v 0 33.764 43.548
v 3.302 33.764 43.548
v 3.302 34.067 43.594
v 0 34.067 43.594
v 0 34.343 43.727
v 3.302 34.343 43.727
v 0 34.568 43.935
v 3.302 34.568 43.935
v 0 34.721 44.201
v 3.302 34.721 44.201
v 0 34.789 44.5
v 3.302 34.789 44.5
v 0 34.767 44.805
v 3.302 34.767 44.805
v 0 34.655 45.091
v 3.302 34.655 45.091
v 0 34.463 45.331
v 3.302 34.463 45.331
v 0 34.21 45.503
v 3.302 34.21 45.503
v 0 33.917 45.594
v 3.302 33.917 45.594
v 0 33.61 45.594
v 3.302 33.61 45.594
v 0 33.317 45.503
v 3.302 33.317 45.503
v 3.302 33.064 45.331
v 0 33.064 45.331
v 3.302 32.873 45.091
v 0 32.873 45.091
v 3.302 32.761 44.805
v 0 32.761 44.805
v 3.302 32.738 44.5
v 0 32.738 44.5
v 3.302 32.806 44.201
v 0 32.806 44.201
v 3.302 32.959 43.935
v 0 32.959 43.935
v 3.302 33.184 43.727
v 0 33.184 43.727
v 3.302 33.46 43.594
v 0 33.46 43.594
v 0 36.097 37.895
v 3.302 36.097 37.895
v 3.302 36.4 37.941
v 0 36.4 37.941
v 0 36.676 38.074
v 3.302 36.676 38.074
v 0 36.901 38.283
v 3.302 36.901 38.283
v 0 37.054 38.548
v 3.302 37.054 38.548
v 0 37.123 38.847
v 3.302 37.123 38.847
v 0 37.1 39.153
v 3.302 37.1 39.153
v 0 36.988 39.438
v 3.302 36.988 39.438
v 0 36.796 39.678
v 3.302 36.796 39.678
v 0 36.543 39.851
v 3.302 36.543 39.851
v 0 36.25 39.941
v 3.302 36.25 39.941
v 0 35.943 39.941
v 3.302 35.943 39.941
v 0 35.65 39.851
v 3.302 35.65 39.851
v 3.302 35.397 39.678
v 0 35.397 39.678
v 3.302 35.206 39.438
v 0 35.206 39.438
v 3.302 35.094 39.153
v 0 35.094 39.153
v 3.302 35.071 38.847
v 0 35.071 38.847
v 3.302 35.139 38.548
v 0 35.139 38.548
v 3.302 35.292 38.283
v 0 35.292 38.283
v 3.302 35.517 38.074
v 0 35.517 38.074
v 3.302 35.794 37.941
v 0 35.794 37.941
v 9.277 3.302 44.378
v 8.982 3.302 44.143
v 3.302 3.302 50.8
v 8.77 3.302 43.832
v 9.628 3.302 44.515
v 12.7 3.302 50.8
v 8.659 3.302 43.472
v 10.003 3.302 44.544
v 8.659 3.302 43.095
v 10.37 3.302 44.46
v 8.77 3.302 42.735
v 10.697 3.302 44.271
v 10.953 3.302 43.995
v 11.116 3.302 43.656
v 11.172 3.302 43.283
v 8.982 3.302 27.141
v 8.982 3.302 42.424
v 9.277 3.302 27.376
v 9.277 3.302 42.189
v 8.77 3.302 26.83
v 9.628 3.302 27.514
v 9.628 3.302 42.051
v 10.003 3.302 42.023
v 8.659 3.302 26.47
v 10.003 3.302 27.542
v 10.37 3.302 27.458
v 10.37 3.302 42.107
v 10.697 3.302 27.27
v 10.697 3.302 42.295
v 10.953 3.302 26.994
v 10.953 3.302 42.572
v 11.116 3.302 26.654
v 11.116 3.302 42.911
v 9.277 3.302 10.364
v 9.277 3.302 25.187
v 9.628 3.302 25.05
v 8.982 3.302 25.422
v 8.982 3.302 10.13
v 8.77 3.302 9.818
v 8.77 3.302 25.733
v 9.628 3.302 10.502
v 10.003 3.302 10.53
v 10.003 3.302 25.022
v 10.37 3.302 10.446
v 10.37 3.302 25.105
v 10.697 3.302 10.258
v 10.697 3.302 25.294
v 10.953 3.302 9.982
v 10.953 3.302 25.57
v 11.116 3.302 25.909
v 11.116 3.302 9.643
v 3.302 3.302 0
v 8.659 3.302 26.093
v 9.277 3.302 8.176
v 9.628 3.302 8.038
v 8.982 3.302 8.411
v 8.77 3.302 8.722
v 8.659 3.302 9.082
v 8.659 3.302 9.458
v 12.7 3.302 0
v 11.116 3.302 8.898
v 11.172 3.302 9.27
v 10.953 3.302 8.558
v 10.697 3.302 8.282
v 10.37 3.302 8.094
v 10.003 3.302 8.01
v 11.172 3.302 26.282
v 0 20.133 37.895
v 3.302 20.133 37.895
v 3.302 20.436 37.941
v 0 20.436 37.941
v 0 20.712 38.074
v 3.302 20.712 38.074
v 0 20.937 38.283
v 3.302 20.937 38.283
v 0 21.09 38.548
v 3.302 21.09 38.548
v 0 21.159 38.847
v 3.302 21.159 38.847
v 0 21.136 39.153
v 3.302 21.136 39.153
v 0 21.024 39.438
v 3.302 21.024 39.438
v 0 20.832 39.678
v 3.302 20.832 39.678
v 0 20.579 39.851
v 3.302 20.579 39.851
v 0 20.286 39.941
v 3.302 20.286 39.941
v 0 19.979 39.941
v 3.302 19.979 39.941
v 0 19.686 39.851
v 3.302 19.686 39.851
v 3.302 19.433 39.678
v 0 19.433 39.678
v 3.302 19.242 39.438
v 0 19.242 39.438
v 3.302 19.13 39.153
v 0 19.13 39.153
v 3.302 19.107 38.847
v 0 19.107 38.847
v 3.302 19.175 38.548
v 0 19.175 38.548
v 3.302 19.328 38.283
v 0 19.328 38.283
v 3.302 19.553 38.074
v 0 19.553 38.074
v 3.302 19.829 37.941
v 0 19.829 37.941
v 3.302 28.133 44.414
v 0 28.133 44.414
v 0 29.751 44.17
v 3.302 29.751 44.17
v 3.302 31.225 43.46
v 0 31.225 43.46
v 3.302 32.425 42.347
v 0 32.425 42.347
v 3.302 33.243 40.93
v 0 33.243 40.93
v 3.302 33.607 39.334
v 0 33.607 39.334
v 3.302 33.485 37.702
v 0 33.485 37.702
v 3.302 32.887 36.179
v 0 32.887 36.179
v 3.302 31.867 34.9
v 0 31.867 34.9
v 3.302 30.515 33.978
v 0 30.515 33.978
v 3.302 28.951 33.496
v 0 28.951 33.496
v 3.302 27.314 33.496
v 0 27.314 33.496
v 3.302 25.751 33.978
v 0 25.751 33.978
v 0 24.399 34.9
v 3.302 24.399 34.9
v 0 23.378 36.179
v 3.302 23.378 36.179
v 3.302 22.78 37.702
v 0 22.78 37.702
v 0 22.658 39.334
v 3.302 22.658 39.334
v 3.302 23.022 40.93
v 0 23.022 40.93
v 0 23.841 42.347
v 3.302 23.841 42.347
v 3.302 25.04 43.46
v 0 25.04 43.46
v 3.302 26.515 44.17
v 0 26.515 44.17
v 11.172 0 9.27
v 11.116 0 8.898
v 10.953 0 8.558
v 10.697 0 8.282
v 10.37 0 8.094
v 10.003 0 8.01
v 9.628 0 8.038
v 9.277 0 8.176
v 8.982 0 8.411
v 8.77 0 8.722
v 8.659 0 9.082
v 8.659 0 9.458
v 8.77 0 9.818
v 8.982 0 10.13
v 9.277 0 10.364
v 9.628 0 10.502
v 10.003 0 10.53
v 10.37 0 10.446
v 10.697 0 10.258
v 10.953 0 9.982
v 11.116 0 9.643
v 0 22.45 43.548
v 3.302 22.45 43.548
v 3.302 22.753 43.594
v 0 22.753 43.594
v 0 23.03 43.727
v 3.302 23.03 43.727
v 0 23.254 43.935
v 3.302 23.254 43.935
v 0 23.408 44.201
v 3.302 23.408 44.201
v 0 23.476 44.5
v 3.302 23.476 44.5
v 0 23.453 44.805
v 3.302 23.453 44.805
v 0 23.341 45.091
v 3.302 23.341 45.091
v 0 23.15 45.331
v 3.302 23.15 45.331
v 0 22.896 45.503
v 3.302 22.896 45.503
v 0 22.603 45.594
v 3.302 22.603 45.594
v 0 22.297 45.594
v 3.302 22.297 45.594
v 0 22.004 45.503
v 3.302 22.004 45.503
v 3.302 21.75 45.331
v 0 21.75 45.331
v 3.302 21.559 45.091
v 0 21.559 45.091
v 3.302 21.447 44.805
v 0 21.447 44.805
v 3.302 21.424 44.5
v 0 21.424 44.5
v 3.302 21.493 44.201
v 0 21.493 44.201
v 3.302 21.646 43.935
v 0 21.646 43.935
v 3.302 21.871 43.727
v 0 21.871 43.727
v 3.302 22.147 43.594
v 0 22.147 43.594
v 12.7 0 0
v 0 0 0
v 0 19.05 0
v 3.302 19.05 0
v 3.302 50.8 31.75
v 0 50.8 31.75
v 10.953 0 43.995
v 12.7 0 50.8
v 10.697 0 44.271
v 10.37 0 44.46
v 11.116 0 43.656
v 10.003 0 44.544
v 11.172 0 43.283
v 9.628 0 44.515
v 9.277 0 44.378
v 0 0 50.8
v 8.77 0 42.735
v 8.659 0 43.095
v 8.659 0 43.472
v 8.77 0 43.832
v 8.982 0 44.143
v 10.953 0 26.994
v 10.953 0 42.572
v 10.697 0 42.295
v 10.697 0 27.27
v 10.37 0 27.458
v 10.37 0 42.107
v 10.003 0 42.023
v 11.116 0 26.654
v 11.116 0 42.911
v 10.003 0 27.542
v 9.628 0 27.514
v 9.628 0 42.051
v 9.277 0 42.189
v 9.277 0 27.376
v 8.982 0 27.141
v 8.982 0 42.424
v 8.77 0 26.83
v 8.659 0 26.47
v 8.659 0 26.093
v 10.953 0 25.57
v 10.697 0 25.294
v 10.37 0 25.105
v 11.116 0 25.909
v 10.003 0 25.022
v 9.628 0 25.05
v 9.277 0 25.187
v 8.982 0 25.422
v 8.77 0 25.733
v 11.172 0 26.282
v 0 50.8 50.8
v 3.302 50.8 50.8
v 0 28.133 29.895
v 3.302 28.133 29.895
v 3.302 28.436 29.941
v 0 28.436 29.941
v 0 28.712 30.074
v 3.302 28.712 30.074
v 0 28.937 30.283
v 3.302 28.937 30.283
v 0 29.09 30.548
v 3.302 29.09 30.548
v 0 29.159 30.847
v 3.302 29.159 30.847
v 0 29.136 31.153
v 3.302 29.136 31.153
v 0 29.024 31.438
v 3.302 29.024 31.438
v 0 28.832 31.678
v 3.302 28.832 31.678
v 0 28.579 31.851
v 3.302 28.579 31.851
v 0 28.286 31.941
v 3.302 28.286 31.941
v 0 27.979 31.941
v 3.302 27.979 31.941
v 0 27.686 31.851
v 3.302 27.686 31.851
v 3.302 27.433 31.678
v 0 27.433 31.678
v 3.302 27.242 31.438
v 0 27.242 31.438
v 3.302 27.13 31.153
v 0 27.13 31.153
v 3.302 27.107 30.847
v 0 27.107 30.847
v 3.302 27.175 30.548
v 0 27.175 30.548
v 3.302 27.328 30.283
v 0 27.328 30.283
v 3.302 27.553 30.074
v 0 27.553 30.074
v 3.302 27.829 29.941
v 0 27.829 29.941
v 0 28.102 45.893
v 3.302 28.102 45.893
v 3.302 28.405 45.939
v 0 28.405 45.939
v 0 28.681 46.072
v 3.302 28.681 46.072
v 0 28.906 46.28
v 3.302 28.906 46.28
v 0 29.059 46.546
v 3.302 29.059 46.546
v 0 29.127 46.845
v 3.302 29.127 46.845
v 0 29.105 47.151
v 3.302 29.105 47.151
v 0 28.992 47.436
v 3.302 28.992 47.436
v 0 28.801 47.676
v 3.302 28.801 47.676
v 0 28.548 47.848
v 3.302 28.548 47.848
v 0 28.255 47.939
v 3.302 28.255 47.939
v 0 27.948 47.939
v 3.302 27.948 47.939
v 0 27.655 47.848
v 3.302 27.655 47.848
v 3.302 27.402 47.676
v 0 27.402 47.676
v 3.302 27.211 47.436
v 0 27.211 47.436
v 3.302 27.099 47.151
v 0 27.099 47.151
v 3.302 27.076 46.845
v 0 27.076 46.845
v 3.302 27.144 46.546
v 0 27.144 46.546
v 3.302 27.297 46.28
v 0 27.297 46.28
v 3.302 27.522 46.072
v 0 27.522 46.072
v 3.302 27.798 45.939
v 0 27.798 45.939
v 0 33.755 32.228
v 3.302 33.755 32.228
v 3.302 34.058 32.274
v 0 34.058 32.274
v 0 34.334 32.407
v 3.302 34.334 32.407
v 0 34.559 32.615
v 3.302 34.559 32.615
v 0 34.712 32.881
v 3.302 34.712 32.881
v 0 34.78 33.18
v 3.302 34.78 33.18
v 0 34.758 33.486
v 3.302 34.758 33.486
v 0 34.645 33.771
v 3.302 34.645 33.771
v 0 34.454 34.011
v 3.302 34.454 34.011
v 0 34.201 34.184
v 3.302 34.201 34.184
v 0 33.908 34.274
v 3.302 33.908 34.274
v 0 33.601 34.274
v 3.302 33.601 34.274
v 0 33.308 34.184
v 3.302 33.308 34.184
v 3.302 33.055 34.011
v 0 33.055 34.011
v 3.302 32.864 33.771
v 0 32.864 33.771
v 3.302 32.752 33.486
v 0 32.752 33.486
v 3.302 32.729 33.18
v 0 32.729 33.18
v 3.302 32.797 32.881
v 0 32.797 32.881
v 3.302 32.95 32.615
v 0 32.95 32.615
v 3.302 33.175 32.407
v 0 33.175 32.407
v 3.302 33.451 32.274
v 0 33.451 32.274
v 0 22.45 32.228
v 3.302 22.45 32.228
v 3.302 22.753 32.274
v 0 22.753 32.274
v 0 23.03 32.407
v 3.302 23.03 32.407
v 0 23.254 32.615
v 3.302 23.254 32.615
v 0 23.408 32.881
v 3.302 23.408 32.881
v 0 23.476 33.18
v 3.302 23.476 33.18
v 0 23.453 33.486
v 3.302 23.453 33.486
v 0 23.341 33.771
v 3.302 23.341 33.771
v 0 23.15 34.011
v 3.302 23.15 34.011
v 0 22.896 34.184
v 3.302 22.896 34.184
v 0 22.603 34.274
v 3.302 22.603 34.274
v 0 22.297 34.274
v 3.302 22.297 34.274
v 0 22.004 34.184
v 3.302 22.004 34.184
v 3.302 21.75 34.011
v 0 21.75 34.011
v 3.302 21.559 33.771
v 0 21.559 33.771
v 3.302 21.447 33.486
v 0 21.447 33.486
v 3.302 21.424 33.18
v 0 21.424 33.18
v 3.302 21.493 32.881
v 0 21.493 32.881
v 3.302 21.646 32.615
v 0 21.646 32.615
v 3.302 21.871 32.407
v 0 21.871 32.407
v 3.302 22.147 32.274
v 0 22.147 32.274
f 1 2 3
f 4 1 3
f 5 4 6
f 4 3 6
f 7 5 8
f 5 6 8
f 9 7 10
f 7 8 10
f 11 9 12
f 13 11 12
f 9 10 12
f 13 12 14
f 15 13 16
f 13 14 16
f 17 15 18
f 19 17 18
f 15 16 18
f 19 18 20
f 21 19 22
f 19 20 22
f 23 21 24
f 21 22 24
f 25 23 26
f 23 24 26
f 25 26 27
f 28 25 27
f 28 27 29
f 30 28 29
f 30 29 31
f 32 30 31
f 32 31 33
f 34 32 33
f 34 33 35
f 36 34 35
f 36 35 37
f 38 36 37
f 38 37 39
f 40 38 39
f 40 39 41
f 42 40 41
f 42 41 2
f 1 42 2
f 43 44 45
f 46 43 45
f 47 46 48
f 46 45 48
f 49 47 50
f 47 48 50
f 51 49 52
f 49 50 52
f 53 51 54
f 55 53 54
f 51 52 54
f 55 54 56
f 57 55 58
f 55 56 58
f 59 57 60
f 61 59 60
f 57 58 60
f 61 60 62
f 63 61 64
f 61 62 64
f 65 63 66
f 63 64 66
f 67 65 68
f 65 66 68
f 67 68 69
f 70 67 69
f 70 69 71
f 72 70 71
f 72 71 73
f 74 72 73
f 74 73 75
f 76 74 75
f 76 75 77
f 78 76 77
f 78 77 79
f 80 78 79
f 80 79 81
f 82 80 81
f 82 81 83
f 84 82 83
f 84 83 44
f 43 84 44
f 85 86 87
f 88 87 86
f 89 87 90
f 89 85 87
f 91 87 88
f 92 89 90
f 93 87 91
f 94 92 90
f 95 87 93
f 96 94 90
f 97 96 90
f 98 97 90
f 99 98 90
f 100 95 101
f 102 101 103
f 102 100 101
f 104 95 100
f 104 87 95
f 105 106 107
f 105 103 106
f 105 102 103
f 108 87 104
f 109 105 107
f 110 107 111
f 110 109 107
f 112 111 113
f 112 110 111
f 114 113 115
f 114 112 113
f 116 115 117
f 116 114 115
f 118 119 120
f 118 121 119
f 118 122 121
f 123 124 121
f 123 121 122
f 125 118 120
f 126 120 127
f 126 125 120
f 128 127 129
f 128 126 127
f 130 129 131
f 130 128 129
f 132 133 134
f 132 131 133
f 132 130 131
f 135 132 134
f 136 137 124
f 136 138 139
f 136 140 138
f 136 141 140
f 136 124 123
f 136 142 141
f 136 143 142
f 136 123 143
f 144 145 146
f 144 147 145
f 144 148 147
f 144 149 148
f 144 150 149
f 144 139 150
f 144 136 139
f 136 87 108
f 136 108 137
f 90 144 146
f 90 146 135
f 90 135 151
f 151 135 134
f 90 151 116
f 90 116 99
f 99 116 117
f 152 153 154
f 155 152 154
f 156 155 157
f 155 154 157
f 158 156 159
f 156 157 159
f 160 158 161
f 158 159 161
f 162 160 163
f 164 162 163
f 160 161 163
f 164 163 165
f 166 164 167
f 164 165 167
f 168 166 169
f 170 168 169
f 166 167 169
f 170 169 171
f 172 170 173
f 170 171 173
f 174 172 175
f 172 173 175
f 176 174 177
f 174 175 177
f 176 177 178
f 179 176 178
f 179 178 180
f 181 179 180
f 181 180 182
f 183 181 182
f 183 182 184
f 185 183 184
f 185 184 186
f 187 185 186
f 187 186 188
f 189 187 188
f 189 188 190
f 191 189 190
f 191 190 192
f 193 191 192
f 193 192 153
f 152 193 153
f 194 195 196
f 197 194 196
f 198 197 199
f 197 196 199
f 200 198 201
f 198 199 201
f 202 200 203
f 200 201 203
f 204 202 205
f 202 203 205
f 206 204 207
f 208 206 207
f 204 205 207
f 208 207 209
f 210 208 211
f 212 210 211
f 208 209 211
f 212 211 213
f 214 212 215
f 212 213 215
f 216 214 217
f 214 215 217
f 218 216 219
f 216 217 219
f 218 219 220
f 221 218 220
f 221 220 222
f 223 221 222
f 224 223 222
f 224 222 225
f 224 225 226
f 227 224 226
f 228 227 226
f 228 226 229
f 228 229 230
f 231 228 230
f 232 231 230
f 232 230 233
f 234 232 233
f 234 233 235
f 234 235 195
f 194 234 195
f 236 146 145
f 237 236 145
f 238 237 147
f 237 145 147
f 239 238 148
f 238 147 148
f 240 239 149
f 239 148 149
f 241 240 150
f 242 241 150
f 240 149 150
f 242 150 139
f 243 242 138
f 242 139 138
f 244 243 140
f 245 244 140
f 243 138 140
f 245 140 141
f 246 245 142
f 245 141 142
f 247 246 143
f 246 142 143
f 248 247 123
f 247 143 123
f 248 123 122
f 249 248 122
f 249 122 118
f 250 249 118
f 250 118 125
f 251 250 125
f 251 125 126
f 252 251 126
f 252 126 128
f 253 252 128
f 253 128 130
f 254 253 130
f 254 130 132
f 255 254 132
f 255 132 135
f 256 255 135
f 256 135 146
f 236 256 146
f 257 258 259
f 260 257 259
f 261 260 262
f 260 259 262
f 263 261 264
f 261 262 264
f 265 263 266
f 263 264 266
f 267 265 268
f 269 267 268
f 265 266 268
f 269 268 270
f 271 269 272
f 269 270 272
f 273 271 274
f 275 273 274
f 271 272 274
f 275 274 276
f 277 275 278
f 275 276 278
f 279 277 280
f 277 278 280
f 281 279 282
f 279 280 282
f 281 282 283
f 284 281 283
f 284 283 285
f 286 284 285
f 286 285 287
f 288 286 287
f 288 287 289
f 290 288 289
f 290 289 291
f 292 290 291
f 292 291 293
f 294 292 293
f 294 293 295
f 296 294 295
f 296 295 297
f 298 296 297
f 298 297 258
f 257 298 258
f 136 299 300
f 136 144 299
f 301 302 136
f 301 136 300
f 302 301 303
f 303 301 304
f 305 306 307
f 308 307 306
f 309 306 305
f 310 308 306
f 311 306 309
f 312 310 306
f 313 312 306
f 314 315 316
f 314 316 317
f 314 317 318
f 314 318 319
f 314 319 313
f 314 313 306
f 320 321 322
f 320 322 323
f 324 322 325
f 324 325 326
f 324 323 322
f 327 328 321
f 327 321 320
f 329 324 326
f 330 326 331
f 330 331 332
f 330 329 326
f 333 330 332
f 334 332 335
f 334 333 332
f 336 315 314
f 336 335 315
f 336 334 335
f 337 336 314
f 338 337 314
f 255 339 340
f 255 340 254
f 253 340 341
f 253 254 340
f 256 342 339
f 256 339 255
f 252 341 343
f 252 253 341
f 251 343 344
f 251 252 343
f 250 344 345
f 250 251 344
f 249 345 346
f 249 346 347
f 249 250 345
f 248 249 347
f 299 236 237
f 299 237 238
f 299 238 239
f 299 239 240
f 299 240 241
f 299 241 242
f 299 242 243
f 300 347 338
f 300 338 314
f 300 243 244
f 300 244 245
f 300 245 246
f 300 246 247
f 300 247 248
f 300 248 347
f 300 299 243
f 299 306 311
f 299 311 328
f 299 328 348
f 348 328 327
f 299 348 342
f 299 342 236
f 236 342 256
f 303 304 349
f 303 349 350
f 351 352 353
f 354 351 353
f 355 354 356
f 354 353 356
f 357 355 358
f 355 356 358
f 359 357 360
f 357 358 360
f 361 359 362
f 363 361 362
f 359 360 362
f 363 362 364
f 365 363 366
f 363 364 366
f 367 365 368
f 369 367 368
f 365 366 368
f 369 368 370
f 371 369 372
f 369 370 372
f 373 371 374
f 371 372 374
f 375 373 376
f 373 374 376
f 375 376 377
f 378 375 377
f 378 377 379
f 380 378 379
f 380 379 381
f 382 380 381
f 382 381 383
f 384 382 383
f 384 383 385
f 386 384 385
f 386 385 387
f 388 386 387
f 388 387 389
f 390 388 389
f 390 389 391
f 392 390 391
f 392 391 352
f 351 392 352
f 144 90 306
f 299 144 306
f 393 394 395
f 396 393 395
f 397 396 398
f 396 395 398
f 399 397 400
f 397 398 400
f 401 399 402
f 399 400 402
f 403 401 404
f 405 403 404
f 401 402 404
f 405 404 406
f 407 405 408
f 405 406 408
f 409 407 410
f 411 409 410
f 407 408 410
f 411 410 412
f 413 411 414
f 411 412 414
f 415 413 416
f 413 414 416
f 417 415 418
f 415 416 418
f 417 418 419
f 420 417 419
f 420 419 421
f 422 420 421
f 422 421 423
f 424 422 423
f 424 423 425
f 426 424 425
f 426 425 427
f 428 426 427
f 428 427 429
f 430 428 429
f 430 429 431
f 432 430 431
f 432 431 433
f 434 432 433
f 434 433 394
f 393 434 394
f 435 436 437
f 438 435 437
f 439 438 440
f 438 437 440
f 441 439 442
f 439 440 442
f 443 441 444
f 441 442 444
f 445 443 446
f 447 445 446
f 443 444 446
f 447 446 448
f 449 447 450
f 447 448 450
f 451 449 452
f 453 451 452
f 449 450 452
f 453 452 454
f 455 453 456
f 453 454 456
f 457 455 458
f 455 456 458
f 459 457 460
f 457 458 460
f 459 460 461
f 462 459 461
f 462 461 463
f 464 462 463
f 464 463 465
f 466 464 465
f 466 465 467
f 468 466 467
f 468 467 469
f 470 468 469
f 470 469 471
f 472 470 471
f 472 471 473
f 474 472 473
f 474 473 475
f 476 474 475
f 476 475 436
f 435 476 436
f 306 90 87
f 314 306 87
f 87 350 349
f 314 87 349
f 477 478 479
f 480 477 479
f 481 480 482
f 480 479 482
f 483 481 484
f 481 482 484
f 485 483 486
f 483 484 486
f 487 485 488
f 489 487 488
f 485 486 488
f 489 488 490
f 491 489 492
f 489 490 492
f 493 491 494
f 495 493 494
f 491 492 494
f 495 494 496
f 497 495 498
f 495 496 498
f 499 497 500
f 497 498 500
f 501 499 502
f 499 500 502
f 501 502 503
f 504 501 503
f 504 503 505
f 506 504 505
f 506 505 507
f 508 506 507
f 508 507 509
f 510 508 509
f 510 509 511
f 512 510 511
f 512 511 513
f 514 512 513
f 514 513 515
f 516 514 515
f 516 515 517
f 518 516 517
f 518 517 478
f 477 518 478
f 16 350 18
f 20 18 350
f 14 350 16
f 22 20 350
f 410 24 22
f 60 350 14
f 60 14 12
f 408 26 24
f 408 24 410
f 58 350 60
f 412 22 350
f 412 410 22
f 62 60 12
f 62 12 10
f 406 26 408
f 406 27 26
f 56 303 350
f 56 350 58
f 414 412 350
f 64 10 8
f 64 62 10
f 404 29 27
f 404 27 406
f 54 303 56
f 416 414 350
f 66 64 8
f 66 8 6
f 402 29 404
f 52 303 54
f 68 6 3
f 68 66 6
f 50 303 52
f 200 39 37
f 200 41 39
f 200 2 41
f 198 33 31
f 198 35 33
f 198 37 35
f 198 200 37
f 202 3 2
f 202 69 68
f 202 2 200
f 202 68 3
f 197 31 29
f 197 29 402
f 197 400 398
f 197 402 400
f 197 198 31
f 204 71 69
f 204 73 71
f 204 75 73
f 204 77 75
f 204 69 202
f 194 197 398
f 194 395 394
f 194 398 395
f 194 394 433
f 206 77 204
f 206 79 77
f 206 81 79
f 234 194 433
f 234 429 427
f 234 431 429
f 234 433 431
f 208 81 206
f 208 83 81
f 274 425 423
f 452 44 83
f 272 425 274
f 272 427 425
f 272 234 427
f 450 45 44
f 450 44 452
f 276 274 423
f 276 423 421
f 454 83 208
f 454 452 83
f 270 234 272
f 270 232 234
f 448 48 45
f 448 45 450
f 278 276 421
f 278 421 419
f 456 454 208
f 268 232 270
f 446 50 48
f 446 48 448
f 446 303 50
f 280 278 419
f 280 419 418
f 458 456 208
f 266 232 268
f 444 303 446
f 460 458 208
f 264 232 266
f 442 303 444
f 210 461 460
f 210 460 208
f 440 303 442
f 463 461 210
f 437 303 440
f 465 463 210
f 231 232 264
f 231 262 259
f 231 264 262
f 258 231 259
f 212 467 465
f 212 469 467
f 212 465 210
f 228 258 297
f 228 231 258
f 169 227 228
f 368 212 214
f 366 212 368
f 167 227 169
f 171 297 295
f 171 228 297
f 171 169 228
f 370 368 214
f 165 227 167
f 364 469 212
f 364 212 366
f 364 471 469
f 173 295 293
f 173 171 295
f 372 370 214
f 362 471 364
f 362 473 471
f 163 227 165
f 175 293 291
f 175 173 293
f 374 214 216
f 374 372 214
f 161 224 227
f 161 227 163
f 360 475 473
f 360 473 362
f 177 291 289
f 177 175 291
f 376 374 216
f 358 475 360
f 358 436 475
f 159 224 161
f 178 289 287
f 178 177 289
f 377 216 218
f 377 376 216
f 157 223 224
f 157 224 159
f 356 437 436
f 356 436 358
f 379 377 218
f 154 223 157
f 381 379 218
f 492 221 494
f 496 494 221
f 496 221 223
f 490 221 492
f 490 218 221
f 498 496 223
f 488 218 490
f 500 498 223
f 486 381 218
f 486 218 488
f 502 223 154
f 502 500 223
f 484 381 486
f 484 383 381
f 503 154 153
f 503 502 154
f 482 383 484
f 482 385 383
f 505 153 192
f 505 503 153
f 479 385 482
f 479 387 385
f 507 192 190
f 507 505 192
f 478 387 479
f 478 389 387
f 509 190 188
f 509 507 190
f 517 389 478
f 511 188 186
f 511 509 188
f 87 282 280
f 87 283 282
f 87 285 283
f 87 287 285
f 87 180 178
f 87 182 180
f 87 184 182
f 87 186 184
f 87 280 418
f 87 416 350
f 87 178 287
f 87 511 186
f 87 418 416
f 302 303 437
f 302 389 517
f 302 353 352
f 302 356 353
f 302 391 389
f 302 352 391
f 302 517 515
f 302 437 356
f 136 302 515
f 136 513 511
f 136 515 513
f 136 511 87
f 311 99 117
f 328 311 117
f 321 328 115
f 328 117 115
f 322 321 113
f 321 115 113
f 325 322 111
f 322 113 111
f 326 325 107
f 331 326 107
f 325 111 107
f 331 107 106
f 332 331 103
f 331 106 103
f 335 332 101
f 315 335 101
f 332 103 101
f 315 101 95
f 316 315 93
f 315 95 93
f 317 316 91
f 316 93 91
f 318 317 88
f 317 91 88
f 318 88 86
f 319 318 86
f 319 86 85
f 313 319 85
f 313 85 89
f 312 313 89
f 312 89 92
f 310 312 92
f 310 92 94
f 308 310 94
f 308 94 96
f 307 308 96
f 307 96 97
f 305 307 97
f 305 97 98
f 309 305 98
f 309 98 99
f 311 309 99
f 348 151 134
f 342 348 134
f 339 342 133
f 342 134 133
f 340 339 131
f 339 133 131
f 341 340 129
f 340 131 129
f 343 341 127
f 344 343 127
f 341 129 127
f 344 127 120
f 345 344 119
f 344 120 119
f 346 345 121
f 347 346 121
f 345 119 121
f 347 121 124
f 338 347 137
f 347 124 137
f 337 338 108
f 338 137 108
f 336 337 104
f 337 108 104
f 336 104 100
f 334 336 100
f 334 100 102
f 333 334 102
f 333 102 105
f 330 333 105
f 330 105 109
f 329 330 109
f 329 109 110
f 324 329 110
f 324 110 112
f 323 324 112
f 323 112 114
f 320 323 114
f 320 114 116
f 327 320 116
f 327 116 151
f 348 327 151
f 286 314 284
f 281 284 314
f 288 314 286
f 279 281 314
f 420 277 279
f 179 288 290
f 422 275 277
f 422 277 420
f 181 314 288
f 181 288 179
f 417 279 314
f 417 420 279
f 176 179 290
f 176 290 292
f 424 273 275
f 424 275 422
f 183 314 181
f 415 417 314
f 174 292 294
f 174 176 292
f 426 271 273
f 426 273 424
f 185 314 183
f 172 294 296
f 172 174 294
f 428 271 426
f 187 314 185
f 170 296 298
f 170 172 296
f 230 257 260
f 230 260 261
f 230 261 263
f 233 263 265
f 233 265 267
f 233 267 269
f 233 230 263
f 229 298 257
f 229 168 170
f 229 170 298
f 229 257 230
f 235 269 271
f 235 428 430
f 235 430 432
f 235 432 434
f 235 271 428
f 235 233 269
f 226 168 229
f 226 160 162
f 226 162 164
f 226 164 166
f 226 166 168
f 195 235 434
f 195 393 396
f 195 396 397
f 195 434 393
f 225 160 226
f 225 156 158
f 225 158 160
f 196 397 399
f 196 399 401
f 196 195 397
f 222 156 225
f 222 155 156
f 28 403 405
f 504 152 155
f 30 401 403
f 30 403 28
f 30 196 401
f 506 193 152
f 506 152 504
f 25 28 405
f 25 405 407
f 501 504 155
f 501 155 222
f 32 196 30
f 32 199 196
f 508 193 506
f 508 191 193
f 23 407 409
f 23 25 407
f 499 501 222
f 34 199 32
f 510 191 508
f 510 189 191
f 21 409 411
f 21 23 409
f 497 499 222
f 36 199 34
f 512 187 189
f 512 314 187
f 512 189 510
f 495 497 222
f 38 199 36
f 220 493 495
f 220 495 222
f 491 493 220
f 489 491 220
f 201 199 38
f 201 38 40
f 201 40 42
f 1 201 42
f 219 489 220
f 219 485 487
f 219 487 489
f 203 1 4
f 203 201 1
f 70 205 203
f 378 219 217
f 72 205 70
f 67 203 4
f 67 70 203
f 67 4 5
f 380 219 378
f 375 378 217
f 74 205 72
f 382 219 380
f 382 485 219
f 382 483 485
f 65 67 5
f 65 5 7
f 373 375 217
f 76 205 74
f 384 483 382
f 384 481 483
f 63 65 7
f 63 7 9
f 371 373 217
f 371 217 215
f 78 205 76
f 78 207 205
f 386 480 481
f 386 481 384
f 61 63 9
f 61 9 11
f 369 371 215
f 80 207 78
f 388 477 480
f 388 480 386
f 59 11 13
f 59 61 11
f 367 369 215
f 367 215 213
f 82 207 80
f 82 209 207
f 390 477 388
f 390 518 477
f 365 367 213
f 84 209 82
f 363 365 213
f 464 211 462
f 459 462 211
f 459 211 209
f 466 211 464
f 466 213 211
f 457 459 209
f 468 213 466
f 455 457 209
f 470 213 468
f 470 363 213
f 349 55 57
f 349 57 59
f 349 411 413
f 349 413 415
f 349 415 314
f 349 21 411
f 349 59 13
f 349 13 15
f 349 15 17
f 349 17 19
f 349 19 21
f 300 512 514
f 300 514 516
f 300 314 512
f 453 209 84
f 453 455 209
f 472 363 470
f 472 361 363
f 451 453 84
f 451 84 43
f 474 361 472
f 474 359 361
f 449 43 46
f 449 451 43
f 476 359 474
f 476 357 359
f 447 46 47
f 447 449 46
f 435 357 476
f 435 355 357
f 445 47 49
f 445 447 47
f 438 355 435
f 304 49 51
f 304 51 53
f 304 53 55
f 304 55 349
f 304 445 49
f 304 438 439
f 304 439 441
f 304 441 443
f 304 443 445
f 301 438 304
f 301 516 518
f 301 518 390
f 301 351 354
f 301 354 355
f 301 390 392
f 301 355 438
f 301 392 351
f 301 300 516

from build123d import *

# Parameters (mm, degrees)
BOSS_EXTRUDE1_DEPTH          = 50.8
F_39_0_0995_DIAMETER_HOLE1_D = 2.5273
F_46_0_081_DIAMETER_HOLE1_D  = 2.0574
SKETCH9_R                    = 5.489854512
CUT_EXTRUDE1_DEPTH           = 73.955945611


with BuildPart() as part:
    # Sketch4 → Boss-Extrude1 (new body)
    with BuildSketch(Plane.XY):
        Polygon((0, 0), (0, 50.8), (3.302, 50.8), (3.302, 3.302), (12.7, 3.302), (12.7, 0), align=None)
    extrude(amount=BOSS_EXTRUDE1_DEPTH)

    # #39 (0.0995) Diameter Hole1 (through all)
    with Locations(Plane(origin=(0, 0, 0), x_dir=(-1, 0, 0), z_dir=(0, -1, 0))):
        with Locations((-9.908705213, -43.283410028), (-9.908705213, -26.281703485), (-9.908705213, -9.270127085)):
            Hole(F_39_0_0995_DIAMETER_HOLE1_D / 2)

    # #46 (0.081) Diameter Hole1 (through all)
    with Locations(Plane.ZY):
        with Locations((38.924052109, 20.132703071), (33.256732001, 22.45014951), (30.924052109, 28.132703071), (33.256732001, 33.754608506), (38.924052109, 36.096767323), (44.576588318, 33.763667384), (46.921652769, 28.101604064), (44.576588318, 22.45014951)):
            Hole(F_46_0_081_DIAMETER_HOLE1_D / 2)

    # Sketch9 → Cut-Extrude1 (cut, through all)
    with BuildSketch(Plane.ZY):
        with Locations((38.924052109, 28.132703071)):
            Circle(SKETCH9_R)
        Polygon((0, 19.05), (31.75, 50.8), (0, 50.8), align=None)
    extrude(amount=-CUT_EXTRUDE1_DEPTH, mode=Mode.SUBTRACT)


solid = part.part
